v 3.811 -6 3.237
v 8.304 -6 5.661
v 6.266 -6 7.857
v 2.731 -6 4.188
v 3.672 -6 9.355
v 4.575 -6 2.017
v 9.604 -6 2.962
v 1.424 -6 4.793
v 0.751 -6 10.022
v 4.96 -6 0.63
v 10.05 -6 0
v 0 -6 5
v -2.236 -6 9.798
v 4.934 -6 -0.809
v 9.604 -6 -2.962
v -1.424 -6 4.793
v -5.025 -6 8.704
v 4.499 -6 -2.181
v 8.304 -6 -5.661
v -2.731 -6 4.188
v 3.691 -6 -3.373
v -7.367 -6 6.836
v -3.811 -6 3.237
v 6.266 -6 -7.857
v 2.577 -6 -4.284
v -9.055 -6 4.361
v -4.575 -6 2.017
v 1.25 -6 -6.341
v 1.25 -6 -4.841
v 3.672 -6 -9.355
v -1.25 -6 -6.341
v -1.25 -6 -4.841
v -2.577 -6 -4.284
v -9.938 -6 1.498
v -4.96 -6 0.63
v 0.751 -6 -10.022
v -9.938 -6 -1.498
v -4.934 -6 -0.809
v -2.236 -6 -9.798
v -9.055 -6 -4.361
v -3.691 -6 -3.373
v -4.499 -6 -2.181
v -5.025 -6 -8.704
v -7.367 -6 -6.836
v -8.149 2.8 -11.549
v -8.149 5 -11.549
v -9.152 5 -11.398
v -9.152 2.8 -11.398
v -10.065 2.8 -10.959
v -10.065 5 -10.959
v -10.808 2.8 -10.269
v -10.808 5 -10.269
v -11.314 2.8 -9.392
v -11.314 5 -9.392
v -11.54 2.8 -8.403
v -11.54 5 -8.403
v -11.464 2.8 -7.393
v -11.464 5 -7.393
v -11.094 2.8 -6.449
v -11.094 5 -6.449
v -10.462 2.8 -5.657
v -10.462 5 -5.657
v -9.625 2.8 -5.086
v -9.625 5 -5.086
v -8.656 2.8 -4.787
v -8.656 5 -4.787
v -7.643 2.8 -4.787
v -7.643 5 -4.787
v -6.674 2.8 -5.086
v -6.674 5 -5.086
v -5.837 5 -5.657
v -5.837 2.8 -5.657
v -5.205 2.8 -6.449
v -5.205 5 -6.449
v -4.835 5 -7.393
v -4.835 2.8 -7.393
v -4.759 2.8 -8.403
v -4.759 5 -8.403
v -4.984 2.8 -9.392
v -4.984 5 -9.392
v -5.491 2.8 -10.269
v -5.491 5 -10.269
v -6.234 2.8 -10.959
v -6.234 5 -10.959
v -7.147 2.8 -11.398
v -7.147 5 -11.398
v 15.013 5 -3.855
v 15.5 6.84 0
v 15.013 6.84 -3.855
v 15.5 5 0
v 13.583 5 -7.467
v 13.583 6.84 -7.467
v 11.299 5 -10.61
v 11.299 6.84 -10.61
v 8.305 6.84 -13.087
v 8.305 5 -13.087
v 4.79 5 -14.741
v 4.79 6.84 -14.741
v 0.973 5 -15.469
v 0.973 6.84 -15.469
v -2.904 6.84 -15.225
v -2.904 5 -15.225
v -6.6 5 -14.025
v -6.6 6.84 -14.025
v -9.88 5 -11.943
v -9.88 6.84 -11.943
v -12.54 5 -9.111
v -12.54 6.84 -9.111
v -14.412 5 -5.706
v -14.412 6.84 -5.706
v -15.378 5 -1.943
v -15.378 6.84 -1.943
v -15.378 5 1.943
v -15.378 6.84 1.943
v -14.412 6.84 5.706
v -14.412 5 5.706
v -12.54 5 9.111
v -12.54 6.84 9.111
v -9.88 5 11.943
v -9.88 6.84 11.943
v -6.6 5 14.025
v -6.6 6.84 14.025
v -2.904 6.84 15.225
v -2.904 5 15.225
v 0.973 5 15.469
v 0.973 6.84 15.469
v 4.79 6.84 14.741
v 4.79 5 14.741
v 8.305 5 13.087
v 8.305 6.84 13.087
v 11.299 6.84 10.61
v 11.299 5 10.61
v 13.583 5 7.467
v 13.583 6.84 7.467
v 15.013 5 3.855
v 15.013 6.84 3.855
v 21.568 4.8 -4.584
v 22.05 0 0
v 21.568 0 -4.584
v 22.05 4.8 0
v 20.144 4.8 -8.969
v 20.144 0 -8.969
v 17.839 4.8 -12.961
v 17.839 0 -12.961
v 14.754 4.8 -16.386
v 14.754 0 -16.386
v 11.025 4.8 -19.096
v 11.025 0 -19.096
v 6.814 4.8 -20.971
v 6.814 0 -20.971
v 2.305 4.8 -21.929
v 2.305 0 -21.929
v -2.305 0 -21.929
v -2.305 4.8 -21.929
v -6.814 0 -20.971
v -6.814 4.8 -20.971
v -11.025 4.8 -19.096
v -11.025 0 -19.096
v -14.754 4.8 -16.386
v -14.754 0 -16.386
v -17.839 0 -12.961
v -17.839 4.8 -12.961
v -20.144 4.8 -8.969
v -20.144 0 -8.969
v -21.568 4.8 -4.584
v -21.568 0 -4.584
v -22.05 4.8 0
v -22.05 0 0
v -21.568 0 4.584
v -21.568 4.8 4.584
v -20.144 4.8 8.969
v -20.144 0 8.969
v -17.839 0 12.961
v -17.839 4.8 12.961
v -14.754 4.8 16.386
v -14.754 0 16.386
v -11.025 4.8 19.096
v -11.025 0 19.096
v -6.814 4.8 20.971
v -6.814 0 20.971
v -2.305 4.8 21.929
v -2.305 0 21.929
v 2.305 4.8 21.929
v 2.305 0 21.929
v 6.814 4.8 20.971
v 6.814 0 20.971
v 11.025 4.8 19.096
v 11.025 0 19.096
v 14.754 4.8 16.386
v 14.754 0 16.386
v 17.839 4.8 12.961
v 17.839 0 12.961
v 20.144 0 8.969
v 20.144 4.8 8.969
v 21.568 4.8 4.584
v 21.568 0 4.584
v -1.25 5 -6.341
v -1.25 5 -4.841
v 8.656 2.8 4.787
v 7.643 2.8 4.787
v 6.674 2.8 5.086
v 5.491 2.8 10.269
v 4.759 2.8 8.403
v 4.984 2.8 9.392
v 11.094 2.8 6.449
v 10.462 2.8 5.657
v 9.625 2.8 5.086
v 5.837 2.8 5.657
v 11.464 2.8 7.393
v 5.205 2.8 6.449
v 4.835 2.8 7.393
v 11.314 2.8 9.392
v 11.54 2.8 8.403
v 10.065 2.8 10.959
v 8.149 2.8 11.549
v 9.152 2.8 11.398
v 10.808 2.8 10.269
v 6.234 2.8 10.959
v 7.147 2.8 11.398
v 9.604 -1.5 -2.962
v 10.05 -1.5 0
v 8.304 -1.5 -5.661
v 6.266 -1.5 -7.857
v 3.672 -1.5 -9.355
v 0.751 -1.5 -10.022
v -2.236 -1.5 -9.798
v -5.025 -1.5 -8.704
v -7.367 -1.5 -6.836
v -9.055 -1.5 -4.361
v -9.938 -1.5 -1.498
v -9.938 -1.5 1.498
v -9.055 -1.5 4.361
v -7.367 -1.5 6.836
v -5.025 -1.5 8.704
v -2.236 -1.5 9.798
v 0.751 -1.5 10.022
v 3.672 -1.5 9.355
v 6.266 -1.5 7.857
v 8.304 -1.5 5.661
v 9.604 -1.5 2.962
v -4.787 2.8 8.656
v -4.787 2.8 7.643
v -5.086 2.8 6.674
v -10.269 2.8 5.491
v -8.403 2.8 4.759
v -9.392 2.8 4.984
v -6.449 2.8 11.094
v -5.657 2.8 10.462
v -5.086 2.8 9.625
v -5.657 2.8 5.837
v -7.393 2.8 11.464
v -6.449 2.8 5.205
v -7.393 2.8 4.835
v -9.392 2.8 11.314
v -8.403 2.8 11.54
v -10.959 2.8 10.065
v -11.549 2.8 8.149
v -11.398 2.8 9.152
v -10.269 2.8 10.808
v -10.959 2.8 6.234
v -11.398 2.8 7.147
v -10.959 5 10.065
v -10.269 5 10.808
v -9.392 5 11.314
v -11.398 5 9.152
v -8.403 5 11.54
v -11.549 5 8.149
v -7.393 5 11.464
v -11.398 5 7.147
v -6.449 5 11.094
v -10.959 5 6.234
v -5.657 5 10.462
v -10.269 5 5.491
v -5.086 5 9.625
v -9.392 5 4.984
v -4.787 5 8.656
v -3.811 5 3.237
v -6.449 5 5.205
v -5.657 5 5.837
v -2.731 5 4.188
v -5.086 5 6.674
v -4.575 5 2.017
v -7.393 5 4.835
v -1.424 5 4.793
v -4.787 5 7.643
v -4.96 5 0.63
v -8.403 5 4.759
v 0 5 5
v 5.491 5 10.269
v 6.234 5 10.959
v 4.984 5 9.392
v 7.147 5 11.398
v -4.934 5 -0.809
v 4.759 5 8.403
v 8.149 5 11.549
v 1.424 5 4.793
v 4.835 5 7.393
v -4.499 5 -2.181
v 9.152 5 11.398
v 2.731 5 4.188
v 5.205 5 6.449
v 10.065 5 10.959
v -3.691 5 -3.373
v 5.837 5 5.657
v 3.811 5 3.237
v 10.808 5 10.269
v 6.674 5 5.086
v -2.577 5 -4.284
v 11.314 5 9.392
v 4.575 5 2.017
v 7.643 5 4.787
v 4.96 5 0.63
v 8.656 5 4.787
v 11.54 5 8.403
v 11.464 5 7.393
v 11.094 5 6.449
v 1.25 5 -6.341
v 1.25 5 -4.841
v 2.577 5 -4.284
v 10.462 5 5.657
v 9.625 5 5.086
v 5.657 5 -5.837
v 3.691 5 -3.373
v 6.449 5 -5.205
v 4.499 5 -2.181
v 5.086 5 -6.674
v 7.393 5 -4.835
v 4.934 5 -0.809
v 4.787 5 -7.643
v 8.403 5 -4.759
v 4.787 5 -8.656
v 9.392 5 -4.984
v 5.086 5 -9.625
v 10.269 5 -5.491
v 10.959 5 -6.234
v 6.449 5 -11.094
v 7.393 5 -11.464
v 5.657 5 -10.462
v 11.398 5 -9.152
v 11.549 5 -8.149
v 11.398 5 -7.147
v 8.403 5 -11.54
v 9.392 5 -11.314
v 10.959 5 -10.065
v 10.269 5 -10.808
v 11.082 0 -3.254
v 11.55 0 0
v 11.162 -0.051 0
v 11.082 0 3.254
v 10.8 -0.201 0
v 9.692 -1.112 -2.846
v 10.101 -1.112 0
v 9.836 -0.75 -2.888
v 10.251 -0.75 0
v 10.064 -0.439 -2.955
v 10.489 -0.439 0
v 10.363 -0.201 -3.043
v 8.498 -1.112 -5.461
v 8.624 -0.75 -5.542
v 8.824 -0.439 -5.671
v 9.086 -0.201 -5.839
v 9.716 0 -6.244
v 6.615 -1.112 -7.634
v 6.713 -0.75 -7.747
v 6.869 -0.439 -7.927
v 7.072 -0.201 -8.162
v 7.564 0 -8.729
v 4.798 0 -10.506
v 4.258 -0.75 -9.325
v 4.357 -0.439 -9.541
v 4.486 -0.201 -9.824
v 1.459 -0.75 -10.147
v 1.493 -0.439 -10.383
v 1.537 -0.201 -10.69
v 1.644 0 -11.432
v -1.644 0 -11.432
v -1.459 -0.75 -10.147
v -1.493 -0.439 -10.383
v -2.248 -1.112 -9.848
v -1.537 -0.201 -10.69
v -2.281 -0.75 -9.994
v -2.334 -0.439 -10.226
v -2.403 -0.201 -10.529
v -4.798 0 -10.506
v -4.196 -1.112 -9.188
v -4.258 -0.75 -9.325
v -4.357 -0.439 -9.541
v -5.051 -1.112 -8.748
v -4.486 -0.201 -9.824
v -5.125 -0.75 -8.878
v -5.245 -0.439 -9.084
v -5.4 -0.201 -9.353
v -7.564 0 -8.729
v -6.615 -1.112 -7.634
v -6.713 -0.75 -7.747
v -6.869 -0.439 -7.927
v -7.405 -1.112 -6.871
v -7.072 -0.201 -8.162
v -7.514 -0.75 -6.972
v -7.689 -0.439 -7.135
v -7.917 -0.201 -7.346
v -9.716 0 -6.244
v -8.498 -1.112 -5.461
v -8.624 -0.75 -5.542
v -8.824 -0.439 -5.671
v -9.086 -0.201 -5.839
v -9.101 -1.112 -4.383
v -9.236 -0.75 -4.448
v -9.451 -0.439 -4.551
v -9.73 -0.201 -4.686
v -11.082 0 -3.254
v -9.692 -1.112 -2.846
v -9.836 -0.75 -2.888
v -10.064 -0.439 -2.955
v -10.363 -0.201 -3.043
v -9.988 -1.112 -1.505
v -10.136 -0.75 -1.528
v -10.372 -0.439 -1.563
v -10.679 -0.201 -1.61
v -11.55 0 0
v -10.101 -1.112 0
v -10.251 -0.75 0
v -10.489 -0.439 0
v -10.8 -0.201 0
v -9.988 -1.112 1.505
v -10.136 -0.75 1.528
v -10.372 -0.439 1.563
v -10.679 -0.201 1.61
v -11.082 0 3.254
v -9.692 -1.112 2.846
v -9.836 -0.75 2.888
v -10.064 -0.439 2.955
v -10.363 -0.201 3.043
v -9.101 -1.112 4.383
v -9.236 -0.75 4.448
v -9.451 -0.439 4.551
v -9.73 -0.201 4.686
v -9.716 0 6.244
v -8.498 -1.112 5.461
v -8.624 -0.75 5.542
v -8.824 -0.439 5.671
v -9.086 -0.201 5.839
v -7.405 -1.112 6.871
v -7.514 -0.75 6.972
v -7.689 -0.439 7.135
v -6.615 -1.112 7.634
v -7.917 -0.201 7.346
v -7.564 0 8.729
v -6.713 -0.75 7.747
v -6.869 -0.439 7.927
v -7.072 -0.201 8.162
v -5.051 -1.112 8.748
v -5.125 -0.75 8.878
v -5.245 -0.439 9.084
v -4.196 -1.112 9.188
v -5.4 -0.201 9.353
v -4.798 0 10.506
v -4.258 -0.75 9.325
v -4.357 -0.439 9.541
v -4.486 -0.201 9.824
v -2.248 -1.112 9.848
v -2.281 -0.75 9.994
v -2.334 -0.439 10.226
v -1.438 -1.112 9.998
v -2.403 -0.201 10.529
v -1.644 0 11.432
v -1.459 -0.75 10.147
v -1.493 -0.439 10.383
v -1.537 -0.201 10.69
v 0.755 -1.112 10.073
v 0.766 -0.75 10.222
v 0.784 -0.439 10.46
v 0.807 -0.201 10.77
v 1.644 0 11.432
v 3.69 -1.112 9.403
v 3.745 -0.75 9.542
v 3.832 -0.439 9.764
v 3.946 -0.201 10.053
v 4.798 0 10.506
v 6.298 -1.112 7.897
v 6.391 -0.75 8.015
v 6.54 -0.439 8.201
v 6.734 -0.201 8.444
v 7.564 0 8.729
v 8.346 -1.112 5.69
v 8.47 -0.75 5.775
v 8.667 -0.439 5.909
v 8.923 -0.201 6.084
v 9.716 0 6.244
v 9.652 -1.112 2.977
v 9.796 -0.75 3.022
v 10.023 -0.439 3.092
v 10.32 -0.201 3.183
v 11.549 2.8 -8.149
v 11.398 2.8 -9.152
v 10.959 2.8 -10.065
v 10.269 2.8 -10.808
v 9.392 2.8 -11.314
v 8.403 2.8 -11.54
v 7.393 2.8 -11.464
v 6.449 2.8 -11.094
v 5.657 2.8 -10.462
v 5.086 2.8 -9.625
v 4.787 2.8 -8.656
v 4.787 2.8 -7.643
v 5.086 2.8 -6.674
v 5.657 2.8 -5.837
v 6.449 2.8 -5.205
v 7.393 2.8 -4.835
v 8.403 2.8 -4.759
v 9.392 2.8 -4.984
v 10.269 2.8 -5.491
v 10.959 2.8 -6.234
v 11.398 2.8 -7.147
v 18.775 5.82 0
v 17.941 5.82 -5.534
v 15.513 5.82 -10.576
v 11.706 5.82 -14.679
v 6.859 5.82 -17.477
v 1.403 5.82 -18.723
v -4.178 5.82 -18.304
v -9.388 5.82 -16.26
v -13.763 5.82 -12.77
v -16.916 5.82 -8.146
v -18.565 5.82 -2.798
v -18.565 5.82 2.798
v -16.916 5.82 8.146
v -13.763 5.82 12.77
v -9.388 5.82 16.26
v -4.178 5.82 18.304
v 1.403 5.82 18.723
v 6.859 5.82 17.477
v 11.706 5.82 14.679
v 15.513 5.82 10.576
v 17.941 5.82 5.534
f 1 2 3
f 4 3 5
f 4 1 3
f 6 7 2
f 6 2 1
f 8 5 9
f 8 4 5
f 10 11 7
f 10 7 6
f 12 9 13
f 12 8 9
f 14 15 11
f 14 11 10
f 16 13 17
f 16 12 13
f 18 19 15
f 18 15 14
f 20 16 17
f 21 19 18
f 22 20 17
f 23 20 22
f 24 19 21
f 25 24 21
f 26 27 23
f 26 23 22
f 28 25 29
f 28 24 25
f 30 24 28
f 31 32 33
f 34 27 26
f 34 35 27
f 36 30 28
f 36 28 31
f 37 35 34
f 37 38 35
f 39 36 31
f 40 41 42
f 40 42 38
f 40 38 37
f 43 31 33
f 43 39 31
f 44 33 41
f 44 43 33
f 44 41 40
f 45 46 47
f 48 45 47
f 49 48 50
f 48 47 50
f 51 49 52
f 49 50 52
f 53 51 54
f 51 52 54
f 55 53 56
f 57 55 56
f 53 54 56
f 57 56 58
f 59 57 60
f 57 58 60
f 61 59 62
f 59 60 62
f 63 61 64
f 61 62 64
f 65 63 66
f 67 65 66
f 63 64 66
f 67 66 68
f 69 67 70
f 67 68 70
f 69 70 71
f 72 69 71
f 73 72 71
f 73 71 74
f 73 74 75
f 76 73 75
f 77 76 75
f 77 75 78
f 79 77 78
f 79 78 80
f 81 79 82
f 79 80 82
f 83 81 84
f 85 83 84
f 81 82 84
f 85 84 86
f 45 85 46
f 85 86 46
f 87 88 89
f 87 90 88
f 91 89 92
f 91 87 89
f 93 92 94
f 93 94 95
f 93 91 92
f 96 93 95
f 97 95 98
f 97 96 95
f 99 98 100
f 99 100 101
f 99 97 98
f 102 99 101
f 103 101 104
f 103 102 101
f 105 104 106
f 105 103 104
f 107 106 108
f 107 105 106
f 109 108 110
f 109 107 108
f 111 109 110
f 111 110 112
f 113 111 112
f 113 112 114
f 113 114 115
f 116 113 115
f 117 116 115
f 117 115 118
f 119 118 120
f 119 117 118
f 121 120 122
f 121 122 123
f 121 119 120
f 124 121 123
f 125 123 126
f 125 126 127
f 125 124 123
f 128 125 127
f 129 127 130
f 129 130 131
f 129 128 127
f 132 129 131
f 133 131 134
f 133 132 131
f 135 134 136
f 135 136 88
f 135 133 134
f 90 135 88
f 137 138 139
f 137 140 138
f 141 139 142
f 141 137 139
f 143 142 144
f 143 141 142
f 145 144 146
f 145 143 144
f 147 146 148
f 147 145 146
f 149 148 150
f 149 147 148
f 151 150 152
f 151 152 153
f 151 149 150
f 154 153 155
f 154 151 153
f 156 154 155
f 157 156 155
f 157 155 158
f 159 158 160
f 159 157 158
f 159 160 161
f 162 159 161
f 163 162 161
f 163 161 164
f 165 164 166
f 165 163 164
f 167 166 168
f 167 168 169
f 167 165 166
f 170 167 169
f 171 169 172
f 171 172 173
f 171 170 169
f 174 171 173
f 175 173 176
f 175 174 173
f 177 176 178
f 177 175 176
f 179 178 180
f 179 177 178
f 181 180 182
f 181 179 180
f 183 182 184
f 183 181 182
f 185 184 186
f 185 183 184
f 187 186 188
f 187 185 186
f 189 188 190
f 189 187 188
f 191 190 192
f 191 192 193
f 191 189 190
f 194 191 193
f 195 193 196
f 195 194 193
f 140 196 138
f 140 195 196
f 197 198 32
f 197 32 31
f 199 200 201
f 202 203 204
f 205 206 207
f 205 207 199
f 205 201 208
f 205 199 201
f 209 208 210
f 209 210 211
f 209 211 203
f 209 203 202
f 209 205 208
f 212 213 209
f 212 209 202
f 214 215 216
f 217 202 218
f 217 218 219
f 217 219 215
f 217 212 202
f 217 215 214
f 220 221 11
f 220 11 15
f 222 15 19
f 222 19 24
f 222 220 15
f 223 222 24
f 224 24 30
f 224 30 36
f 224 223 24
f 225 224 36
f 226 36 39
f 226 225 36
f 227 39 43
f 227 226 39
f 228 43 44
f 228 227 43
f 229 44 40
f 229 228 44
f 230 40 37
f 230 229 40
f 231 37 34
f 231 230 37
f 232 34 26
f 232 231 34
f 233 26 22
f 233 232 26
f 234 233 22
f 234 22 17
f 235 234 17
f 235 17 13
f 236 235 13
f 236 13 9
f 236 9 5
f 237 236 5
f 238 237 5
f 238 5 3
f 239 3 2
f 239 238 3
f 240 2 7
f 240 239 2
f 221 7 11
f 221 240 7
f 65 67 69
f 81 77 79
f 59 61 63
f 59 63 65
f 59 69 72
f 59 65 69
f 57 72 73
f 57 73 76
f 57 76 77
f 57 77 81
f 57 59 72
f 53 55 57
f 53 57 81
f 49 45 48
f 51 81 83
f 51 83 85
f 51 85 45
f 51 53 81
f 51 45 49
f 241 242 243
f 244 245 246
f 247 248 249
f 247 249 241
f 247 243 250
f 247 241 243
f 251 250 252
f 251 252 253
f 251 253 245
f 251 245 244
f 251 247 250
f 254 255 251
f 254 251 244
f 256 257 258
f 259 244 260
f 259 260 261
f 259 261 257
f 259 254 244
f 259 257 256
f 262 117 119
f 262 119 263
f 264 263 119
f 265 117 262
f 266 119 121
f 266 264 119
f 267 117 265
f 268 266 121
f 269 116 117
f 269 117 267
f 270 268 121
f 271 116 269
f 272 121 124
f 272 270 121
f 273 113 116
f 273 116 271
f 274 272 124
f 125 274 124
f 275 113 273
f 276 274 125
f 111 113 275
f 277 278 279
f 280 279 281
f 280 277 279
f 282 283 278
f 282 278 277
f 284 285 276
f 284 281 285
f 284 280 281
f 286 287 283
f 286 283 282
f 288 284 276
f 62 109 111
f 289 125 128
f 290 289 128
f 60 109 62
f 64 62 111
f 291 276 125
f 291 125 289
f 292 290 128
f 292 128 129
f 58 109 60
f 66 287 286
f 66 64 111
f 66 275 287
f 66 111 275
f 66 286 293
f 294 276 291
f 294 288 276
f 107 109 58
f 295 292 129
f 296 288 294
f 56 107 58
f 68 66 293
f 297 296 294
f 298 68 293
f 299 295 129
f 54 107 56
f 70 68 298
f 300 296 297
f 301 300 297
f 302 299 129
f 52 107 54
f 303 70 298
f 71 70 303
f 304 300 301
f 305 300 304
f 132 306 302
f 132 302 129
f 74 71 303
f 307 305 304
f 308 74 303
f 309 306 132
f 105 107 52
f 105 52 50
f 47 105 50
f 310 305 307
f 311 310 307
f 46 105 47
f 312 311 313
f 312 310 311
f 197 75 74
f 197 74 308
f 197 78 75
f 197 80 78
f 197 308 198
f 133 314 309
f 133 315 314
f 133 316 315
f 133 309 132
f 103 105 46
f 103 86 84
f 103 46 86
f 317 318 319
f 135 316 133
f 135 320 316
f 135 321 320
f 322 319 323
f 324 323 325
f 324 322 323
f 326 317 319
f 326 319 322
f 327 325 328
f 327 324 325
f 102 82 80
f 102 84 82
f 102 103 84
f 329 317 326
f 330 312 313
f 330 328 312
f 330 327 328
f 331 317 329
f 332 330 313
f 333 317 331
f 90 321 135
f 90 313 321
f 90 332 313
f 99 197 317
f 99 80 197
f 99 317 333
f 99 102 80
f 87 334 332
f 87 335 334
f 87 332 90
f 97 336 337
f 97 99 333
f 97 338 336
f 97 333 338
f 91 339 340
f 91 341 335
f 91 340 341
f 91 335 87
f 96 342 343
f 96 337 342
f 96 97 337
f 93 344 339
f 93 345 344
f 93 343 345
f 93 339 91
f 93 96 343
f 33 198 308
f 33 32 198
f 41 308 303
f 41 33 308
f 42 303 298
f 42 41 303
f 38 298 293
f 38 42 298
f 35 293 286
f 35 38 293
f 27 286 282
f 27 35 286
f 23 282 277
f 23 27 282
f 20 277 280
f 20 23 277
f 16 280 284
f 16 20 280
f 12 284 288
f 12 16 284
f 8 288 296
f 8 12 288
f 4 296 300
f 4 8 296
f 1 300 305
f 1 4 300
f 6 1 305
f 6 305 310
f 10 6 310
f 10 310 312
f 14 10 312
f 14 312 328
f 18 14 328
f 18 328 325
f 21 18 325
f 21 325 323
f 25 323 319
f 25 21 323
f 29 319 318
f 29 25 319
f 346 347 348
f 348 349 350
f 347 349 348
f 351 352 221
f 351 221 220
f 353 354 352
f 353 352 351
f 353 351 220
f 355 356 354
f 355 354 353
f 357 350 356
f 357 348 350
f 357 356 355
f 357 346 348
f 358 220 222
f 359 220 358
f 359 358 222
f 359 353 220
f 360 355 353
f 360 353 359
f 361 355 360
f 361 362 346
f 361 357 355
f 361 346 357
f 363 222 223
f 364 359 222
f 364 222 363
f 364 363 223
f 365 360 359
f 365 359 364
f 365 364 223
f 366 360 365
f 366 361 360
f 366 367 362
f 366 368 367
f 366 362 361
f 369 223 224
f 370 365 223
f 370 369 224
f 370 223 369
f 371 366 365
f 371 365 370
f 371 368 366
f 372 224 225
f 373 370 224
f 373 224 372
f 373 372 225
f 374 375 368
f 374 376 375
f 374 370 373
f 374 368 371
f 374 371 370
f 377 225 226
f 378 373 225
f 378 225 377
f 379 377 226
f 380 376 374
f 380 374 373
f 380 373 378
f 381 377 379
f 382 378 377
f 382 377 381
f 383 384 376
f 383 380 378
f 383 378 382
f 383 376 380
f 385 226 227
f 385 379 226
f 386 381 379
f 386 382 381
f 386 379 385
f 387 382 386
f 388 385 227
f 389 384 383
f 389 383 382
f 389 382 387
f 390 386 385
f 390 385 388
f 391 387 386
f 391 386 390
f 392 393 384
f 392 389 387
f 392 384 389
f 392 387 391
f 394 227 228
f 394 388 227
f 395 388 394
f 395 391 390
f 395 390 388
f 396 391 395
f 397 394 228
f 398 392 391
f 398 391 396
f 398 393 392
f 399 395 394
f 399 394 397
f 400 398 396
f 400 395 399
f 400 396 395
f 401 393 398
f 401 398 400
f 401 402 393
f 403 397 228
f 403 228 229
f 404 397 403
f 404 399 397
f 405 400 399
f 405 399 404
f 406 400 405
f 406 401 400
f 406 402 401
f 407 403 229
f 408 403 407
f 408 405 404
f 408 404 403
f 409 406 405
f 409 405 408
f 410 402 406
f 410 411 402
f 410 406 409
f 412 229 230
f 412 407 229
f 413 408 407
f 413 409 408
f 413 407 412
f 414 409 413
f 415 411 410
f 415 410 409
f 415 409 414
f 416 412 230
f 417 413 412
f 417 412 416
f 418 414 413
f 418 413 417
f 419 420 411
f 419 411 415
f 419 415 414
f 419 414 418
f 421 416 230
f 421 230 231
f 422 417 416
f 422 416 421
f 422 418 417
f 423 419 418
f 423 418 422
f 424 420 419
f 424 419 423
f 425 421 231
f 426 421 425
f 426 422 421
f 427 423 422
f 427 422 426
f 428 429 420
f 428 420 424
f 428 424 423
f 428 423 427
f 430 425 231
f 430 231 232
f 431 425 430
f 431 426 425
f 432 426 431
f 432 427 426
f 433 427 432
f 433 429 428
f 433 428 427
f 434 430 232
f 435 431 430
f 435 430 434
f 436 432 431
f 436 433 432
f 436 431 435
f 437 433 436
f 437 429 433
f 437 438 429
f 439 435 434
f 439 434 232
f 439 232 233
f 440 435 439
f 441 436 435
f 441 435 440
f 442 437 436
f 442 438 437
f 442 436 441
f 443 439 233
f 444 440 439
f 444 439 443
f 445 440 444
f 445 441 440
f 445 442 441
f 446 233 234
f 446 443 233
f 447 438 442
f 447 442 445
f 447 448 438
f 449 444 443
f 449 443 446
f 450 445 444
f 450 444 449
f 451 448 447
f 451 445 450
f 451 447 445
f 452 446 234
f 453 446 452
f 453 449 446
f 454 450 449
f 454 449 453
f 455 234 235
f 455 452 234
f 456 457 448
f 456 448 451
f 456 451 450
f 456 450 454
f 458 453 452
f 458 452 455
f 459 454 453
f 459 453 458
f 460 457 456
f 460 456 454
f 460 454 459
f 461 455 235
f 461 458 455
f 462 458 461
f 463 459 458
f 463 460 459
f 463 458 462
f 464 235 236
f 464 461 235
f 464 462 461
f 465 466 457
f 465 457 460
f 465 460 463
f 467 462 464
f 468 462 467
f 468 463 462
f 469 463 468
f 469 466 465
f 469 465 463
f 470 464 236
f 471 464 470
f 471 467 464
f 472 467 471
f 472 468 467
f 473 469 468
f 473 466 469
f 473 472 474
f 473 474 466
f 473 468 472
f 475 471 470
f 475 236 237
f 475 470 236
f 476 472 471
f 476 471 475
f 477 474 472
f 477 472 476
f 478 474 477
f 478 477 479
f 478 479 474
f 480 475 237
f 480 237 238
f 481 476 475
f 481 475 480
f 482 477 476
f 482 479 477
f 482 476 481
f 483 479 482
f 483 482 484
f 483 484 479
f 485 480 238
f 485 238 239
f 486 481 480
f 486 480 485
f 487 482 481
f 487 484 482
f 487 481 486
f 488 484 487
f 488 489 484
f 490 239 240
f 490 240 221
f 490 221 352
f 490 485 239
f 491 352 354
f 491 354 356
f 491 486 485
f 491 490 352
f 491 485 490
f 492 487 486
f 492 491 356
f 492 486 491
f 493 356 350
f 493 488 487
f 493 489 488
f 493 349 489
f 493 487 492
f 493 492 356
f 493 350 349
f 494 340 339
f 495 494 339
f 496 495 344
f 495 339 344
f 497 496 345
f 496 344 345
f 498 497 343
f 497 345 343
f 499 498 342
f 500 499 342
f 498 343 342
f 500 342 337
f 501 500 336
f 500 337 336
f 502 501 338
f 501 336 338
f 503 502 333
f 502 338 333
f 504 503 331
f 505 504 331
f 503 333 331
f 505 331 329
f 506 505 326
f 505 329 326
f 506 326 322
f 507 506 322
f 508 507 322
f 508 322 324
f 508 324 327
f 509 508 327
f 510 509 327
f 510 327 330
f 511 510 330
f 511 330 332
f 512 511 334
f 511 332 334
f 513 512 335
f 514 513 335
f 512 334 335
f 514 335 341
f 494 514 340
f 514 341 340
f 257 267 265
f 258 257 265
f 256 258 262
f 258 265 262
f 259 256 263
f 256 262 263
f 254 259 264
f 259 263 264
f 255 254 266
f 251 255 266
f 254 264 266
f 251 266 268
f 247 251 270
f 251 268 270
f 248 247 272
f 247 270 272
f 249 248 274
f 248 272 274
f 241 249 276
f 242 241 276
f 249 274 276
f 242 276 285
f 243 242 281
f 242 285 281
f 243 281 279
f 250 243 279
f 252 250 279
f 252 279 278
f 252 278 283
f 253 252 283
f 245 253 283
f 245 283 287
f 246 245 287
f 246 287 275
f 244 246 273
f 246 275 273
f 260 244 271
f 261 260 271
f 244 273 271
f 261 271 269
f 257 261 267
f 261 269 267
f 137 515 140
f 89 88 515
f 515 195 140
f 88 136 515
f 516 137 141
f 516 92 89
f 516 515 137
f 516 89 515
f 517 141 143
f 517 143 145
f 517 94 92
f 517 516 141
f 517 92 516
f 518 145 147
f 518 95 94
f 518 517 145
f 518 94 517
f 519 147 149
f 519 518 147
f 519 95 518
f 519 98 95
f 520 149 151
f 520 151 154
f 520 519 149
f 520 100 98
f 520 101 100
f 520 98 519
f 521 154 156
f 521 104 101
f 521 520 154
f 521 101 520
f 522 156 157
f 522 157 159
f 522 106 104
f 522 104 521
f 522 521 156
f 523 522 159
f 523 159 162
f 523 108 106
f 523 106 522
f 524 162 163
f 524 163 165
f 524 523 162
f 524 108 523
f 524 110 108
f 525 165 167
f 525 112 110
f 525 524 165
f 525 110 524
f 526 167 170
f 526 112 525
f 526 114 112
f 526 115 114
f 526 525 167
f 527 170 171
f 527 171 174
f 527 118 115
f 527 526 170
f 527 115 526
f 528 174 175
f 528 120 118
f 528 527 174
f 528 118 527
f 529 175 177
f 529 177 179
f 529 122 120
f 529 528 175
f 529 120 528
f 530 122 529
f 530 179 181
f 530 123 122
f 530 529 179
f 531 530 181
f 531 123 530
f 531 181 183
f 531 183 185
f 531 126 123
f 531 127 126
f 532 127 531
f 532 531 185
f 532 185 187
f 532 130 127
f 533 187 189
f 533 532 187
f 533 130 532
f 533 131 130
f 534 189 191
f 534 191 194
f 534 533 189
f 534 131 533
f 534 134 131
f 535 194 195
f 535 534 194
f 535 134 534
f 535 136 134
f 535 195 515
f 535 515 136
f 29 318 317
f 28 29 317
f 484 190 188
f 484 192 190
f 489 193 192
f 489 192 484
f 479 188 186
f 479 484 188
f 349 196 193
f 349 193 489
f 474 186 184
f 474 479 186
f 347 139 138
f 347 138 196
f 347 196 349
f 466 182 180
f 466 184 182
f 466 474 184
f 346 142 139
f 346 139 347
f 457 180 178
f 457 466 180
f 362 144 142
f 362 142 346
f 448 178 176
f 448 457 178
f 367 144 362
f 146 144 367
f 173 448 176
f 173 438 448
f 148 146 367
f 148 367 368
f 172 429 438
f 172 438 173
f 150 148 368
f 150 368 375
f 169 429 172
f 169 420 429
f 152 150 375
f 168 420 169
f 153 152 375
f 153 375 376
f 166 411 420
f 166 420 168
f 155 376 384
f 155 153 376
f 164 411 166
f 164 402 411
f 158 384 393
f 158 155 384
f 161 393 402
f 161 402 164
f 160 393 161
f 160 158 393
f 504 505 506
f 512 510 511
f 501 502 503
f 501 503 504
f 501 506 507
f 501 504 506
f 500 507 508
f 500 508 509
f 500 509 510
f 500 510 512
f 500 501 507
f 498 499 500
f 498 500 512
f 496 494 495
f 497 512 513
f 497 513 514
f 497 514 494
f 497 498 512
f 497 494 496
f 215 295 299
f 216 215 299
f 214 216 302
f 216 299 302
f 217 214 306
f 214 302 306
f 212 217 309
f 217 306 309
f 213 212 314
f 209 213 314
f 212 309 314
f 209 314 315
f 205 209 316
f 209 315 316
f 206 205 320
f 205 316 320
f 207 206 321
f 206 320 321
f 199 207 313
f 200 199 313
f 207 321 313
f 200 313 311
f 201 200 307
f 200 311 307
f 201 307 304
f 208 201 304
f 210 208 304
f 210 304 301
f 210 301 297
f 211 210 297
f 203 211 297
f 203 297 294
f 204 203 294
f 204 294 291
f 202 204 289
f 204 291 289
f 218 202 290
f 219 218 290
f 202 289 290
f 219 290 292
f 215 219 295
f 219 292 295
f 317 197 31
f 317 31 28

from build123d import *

# Parameters (mm, degrees)
FILLET1_R               = 1.5
SKETCH2_W               = 2.5
SKETCH2_H               = 1.5
CUT_EXTRUDE1_DEPTH      = 7.84
CUT_EXTRUDE1_DEPTH_BACK = 7
SKETCH3_R               = 3.4
CUT_EXTRUDE2_DEPTH      = 2.2
CIRPATTERN1_COUNT       = 4


with BuildPart() as part:
    # Sketch1 → Revolve1 (revolve)
    with BuildSketch(Plane.XY):
        Polygon((5, -6), (10.05, -6), (10.05, 0), (22.05, 0), (22.05, 4.8), (15.5, 6.84), (15.5, 5), (5, 5), align=None)
    revolve(axis=Axis((0, 0, 0), (0, 1, 0)))

    # Fillet1
    fillet1_edges = [part.edges().sort_by_distance(p)[0] for p in [
        (-10.05, 0, 0),
    ]]
    fillet(fillet1_edges, radius=FILLET1_R)

    # Sketch2 → Cut-Extrude1 (cut, two sides)
    with BuildSketch(Plane(origin=(0, 0, 0), x_dir=(1, 0, 0), z_dir=(0, 1, 0))) as cut_extrude1_sk:
        with Locations((0, 5.591229183)):
            Rectangle(SKETCH2_W, SKETCH2_H)
    extrude(amount=CUT_EXTRUDE1_DEPTH, mode=Mode.SUBTRACT)
    extrude(cut_extrude1_sk.sketch, amount=-CUT_EXTRUDE1_DEPTH_BACK, mode=Mode.SUBTRACT)

    # Sketch3 → Cut-Extrude2 (cut)
    with BuildSketch(Plane(origin=(0, 5, 0), x_dir=(1, 0, 0), z_dir=(0, 1, 0))):
        with Locations((8.149405653, 8.149405653)):
            Circle(SKETCH3_R)
    cut_extrude2 = extrude(amount=-CUT_EXTRUDE2_DEPTH, mode=Mode.SUBTRACT)

    # CirPattern1: Cut-Extrude2 ×4 about axis
    cirpattern1_axis = Axis((0, 0, 0), (0, 1, 0))
    for i in range(1, CIRPATTERN1_COUNT):
        add(cut_extrude2.rotate(cirpattern1_axis, i * 360 / CIRPATTERN1_COUNT), mode=Mode.SUBTRACT)


solid = part.part
